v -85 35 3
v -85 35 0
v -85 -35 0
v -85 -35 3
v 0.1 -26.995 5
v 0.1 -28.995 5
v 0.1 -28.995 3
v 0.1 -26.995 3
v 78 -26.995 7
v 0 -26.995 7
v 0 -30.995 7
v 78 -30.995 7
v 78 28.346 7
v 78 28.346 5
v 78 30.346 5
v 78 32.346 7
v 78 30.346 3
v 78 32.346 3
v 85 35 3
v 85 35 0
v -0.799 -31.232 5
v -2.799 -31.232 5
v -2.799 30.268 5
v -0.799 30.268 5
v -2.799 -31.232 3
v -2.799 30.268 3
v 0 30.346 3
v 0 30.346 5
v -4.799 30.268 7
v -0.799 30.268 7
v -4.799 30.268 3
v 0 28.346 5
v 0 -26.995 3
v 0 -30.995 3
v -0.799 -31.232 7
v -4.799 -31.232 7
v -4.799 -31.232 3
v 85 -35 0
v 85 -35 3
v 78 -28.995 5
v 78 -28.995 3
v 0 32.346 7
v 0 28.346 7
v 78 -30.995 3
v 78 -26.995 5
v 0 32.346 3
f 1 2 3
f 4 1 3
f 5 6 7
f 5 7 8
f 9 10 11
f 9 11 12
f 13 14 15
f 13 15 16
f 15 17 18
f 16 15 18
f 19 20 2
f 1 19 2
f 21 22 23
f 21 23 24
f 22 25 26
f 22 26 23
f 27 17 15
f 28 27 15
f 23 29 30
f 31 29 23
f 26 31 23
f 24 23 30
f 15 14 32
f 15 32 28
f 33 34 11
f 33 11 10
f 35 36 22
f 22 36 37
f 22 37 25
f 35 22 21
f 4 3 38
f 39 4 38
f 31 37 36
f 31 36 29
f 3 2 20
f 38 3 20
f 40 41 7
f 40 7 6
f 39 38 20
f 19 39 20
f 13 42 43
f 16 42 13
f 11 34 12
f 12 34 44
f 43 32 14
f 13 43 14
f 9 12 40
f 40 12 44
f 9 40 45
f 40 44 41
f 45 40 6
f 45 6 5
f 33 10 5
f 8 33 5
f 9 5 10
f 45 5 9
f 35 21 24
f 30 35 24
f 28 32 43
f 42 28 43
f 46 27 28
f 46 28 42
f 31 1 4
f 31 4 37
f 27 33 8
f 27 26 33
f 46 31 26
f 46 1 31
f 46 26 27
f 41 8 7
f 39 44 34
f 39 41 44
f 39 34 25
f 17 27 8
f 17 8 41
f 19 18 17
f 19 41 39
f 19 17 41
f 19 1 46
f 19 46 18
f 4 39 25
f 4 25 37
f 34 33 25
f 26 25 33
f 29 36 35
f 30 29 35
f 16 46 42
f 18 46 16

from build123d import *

# Parameters (mm, degrees)
F0_W     = 4
F0_H     = 61.5
F0_W_2   = 78
F0_H_2   = 4
F1_DEPTH = 3
F2_DEPTH = 7
F3_W     = 2
F3_H     = 2
F4_DEPTH = 77.9
F5_W     = 2
F5_H     = 2
F6_DEPTH = 64.1
F7_W     = 2
F7_H     = 2
F8_DEPTH = 78


# Not quite as in the source:
# - a feature names something its author has since deleted; it is built from what else it names


with BuildPart() as f1:
    # F0 (on Top) → F1 (new body)
    with BuildSketch(Plane.XY):
        Polygon((85, 35), (-85, 35), (-85, -25.7047470659), (-85, -35), (-7, -35), (85, -35), align=None)
        with Locations((-2.7990786843, -0.482085079)):
            Rectangle(F0_W, F0_H, mode=Mode.SUBTRACT)
        with Locations((39, -28.9953801334)):
            Rectangle(F0_W_2, F0_H_2, mode=Mode.SUBTRACT)
        with Locations((39, 30.3457357436)):
            Rectangle(F0_W_2, F0_H_2, mode=Mode.SUBTRACT)
    extrude(amount=F1_DEPTH)

    # F0 (on Top) → F2 (join)
    with BuildSketch(Plane.XY):
        with Locations((-2.7990786843, -0.482085079)):
            Rectangle(F0_W, F0_H)
        with Locations((39, -28.9953801334)):
            Rectangle(F0_W_2, F0_H_2)
        with Locations((39, 30.3457357436)):
            Rectangle(F0_W_2, F0_H_2)
    extrude(amount=F2_DEPTH)

    # F3 (on face) → F4 (cut)
    with BuildSketch(Plane.YZ.offset(78)):
        with Locations((-27.9953801334, 4)):
            Rectangle(F3_W, F3_H)
    extrude(amount=-F4_DEPTH, mode=Mode.SUBTRACT)

    # F5 (on face) → F6 (cut)
    with BuildSketch(Plane.XZ.offset(31.232085079)):
        with Locations((-1.7990786843, 4)):
            Rectangle(F5_W, F5_H)
    extrude(amount=-F6_DEPTH, mode=Mode.SUBTRACT)

    # F7 (on face) → F8 (cut)
    with BuildSketch(Plane.YZ.offset(78)):
        with Locations((29.3457357436, 4)):
            Rectangle(F7_W, F7_H)
    extrude(amount=-F8_DEPTH, mode=Mode.SUBTRACT)


solid = f1.part
